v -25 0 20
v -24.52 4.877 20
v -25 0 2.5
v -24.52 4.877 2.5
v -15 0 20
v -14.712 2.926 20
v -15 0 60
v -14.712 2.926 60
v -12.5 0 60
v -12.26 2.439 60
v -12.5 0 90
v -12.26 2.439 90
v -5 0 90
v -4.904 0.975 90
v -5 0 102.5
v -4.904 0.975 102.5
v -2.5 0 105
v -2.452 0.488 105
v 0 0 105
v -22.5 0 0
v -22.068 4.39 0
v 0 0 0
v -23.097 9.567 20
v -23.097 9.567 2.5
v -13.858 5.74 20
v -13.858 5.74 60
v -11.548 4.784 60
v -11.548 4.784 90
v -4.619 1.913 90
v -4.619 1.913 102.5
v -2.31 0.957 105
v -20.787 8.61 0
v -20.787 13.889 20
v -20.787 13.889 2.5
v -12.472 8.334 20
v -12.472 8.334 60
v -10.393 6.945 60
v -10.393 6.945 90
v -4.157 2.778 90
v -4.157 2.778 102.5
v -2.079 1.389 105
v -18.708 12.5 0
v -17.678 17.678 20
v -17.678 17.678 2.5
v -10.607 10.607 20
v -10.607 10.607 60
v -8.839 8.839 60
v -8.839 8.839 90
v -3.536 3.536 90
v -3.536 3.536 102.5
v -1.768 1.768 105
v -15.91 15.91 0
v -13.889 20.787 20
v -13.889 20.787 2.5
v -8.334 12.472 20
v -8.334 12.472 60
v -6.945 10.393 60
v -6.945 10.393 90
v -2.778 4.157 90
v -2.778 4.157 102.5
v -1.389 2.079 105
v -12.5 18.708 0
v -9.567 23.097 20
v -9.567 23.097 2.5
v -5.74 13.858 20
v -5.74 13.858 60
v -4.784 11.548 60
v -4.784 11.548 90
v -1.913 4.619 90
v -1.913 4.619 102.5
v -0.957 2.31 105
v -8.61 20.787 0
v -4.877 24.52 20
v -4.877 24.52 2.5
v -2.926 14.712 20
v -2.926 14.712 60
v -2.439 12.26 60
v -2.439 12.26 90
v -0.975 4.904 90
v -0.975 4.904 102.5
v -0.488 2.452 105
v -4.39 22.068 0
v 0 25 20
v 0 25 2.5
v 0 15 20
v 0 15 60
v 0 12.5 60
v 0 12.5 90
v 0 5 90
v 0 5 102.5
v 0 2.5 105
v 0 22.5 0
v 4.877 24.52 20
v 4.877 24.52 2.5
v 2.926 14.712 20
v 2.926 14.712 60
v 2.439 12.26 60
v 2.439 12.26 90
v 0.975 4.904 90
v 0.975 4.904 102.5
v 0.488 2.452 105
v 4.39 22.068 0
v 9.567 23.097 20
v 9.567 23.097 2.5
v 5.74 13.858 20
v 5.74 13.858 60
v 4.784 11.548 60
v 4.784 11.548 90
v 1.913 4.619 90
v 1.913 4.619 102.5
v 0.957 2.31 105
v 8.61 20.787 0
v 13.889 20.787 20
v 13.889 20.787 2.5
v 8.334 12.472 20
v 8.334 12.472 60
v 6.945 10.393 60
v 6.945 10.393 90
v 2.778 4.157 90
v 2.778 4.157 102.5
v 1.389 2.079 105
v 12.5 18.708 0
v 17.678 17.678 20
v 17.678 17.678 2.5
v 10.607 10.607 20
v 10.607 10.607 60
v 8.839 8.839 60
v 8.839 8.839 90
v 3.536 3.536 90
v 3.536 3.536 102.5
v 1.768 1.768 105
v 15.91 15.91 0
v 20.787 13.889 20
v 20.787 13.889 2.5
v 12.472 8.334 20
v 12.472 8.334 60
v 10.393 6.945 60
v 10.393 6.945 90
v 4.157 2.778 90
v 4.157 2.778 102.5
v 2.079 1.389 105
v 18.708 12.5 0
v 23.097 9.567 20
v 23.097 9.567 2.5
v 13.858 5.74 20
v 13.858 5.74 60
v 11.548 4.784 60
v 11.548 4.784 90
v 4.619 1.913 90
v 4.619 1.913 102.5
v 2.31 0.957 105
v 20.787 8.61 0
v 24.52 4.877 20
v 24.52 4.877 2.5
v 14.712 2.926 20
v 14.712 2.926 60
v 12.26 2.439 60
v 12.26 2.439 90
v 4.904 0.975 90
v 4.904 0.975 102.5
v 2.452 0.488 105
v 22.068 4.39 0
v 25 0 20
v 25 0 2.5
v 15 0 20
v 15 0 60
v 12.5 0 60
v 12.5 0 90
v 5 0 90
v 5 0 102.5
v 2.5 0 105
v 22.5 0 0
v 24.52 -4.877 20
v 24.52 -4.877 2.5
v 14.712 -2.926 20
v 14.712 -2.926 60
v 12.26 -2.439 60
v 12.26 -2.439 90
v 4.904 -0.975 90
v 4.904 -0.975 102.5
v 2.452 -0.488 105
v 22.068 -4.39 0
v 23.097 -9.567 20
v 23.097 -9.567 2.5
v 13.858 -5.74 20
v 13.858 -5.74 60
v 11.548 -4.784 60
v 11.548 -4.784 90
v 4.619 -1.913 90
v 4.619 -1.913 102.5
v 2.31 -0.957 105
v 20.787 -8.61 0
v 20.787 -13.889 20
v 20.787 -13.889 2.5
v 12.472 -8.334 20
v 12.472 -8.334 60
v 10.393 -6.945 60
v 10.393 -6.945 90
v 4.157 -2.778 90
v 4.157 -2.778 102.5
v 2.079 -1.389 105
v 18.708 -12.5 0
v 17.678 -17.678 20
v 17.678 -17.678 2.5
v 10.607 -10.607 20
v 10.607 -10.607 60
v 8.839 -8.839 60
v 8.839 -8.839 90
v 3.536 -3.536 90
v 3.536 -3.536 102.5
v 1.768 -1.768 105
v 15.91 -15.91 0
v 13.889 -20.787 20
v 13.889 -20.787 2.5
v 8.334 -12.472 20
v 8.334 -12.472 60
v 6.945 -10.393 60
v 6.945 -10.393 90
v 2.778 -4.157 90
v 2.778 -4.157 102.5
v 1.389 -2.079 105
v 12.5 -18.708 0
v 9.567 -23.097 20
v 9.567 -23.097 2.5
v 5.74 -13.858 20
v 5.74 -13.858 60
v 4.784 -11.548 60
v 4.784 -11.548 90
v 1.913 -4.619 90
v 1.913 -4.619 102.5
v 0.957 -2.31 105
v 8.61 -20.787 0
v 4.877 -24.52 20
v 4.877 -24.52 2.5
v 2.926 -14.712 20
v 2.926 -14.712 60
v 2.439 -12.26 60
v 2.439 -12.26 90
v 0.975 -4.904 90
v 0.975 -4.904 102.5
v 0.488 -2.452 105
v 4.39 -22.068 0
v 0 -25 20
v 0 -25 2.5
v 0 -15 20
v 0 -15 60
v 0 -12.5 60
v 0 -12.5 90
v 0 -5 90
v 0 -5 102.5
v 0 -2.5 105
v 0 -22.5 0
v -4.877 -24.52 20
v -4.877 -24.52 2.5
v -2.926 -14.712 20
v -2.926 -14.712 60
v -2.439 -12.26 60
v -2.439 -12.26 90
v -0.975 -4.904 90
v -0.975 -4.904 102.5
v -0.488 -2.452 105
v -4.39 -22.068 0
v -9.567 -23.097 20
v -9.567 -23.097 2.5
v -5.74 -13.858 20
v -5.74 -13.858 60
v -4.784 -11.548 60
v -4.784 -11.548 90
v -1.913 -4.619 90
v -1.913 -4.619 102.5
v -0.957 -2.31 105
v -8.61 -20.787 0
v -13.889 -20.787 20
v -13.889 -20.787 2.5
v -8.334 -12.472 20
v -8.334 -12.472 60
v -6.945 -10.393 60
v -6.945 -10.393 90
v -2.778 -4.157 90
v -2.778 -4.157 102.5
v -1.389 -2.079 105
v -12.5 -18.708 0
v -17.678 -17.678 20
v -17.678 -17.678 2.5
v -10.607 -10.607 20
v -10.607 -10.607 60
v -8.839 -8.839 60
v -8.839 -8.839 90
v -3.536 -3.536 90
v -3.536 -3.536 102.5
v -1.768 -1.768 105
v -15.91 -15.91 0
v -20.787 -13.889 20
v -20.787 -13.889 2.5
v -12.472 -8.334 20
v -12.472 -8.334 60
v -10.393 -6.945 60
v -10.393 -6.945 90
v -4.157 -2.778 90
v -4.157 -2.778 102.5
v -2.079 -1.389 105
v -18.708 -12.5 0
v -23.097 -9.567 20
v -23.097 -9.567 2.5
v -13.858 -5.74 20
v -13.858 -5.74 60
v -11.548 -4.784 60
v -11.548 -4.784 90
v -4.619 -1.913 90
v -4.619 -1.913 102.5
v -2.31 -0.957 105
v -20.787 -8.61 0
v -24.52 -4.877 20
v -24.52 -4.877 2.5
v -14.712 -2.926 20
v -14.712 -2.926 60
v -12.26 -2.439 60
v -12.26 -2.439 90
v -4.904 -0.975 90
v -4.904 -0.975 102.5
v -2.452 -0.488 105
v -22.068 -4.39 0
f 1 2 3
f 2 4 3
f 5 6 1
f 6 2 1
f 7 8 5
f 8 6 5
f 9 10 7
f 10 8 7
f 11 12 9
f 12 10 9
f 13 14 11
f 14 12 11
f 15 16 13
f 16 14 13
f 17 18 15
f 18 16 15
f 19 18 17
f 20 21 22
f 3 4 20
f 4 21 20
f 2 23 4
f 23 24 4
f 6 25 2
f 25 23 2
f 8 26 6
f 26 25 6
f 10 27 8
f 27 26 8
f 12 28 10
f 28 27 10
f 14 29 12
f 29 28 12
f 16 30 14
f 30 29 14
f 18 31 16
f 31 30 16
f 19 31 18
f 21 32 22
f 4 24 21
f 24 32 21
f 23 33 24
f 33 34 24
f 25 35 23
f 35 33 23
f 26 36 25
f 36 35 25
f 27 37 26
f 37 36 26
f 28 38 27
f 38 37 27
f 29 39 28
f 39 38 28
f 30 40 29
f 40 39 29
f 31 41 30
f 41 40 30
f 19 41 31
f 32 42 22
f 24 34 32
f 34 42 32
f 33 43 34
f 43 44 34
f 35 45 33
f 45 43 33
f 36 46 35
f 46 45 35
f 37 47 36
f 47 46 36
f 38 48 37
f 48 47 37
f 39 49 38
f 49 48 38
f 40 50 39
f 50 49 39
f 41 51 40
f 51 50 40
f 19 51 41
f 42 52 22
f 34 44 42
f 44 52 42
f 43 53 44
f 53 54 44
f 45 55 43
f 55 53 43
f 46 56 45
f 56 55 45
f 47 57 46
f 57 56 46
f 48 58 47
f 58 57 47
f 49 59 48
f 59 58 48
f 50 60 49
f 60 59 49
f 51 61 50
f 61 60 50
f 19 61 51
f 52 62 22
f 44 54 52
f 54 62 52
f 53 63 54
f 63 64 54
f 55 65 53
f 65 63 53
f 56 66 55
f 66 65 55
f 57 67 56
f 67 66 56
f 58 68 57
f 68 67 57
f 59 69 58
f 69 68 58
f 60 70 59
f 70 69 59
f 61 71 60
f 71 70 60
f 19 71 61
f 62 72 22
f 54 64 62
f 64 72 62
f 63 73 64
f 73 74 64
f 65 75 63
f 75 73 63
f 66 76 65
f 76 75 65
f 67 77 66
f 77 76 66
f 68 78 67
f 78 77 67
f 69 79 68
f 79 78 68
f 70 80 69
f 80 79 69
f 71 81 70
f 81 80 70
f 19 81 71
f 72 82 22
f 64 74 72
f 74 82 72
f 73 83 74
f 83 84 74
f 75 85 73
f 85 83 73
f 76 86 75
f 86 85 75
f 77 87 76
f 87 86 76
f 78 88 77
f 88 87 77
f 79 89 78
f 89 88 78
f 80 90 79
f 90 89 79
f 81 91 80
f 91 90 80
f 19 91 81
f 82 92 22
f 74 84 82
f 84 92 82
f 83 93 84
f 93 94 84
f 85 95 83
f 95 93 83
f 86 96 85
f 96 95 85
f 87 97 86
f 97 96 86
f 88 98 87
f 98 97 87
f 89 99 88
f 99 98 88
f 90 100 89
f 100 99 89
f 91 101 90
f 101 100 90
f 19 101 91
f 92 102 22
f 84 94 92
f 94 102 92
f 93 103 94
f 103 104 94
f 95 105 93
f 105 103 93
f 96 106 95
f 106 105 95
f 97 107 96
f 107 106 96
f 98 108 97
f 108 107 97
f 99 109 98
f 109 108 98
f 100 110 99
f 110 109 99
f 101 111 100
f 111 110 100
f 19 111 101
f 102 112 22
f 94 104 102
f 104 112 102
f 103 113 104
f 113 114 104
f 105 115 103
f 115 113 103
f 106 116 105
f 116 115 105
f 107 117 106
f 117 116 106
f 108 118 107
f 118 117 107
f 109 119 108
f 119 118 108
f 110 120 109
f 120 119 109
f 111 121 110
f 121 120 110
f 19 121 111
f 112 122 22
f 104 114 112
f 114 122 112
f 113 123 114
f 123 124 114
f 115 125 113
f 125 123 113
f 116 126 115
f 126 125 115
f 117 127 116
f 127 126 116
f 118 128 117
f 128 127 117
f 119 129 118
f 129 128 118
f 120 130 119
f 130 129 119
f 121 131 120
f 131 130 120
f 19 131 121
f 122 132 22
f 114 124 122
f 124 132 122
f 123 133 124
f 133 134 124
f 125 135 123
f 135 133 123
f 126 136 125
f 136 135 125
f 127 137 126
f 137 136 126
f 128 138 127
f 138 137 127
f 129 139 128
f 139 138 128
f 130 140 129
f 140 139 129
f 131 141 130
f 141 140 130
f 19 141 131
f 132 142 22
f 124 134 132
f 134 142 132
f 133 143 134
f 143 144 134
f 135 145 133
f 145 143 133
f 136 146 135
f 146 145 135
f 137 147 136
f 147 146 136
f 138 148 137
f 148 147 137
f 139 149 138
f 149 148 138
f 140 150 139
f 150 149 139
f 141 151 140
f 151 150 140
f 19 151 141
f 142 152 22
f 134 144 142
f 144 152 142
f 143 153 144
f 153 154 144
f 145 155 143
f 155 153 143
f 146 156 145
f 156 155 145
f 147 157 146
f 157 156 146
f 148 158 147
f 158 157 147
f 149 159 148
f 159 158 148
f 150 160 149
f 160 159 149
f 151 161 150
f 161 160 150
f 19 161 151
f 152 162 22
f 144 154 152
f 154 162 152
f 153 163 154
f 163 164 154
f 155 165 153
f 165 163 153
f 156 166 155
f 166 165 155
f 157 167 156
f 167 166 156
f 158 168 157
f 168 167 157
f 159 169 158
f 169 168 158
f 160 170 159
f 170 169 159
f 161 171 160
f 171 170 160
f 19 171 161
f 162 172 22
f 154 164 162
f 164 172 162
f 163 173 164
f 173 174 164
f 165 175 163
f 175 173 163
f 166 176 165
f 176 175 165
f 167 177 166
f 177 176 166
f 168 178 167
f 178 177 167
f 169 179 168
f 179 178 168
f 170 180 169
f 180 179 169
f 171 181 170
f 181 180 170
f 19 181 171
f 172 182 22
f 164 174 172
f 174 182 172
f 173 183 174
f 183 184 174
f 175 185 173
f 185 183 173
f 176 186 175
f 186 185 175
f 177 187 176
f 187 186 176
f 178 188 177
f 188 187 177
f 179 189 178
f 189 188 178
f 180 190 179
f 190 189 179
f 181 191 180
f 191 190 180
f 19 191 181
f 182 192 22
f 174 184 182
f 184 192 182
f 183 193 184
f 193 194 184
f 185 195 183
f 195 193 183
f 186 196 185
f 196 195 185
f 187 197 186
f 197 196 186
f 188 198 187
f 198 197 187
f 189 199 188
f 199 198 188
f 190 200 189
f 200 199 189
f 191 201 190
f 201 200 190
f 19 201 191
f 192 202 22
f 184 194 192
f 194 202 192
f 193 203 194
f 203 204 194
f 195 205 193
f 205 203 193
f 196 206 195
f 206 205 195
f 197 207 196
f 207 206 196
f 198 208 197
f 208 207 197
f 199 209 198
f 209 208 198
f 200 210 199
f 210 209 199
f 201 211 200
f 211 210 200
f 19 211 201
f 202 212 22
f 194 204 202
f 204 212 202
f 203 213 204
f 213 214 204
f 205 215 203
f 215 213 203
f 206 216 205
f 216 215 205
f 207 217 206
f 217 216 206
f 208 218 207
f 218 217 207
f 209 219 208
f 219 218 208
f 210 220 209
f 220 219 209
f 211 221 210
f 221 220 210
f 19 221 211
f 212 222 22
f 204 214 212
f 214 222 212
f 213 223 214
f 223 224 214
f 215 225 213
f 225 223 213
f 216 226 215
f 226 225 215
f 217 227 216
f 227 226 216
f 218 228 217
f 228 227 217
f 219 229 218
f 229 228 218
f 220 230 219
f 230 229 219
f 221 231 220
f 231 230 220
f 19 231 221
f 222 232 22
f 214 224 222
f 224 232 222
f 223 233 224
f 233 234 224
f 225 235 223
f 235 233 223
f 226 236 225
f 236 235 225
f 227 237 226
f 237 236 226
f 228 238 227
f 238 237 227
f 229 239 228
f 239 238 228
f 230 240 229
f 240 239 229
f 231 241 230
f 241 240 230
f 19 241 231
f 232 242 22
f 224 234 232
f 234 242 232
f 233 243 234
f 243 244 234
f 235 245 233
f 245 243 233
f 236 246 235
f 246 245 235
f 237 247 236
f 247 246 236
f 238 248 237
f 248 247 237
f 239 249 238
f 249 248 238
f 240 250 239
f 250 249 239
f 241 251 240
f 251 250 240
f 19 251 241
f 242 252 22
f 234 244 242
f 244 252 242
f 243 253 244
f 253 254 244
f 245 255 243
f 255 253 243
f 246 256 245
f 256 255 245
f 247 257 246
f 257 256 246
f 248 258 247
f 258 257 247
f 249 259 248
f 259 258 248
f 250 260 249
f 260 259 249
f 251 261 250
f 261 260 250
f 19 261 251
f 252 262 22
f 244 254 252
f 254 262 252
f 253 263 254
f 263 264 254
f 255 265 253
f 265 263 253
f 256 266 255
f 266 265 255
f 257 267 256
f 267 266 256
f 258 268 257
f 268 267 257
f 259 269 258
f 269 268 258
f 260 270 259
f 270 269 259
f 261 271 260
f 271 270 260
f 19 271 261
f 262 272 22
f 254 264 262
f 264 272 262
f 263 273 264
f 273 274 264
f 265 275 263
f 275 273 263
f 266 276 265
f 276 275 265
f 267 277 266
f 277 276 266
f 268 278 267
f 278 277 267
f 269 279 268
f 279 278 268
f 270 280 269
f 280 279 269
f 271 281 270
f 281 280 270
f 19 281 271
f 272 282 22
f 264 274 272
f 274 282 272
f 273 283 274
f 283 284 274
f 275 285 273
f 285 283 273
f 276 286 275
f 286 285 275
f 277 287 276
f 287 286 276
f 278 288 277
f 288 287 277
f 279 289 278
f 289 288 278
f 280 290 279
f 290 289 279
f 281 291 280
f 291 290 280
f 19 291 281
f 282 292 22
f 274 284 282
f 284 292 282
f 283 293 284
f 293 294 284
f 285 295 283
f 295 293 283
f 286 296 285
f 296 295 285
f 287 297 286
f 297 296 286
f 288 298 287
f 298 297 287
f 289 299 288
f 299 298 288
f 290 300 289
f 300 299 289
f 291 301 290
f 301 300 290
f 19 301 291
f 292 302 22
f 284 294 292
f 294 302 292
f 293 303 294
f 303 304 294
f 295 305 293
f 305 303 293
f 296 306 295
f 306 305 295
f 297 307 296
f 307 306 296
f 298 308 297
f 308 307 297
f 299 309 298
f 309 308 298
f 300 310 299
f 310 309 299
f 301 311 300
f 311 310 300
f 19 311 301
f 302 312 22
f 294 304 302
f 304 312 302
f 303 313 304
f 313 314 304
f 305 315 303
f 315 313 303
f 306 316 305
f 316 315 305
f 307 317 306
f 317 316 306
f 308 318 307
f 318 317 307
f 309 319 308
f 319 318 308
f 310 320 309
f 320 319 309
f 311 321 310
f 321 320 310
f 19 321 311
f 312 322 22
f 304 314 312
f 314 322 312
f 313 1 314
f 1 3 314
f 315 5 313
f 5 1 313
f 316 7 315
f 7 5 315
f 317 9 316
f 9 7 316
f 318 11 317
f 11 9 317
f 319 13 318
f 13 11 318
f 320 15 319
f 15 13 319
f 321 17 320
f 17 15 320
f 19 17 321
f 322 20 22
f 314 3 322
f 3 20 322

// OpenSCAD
$fn = 32;

// ----------------------------------------------------------------------
// Stepped shaft: diameters 50, 30, 25, 10 mm, 105 mm long
// ----------------------------------------------------------------------

// --- parameters (mm) ---
d1 = 50;                  // step 1 diameter
len1 = 20;                // step 1 length
d2 = 30;                  // step 2 diameter
len2 = 40;                // step 2 length
d3 = 25;                  // step 3 diameter
len3 = 30;                // step 3 length
d4 = 10;                  // step 4 diameter
len4 = 15;                // step 4 length
total = 105;              // overall length
chamfer = 2.5;            // end chamfer

/* closed turning profile: x is the radius, y is the length */
profile = [[0, 0], [25 - chamfer, 0], [25, chamfer], [25, 20], [15, 20], [15, 60], [12.5, 60], [12.5, 90], [5, 90], [5, 102.5], [2.5, 105], [0, 105]];

difference() {
  rotate_extrude() polygon(profile);
}
